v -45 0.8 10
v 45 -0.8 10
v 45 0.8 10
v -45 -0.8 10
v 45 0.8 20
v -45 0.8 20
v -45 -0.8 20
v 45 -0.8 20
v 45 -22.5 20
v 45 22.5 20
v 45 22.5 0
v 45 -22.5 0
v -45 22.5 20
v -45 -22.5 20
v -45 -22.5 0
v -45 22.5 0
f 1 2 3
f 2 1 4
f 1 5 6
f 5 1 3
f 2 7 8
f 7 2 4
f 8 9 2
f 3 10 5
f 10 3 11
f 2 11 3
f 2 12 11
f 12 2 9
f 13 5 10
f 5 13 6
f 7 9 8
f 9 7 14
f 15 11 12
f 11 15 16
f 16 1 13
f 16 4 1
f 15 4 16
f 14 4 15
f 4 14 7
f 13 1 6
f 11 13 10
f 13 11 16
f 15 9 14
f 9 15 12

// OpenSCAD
// Microscope slide drying rack
// Print orientation: base block on bed (z = 0), slots open upward (+Z)

// ---------------- Parameters ----------------
block_len    = 90;    // base block length along X (mm)
block_wid    = 45;    // base block width along Y (mm)
block_h      = 20;    // base block height along Z (mm)

slot_count   = 10;    // number of slide slots
slot_len     = 77;    // slot length along X (mm)
slot_w       = 1.6;   // slot width along Y (mm)
slot_depth   = 10;    // slot depth from top face (mm)
slot_pitch   = 3.5;   // centre-to-centre slot spacing along Y (mm)

eps          = 0.5;   // overshoot of cutters past the top face (mm)

// ---------------- Model ----------------
difference() {
    // Base block, centred in X and Y, resting on z = 0
    translate([-block_len/2, -block_wid/2, 0])
        cube([block_len, block_wid, block_h]);

    // Parallel slots running along X, centred as a group in X and Y
    for (i = [0 : slot_count - 1]) {
        x = (i - (slot_count - 1)/2) * slot_pitch;
        translate([x - slot_len/2, -slot_w/2, block_h - slot_depth])
            cube([slot_len, slot_w, slot_depth + eps]);
    }
}
